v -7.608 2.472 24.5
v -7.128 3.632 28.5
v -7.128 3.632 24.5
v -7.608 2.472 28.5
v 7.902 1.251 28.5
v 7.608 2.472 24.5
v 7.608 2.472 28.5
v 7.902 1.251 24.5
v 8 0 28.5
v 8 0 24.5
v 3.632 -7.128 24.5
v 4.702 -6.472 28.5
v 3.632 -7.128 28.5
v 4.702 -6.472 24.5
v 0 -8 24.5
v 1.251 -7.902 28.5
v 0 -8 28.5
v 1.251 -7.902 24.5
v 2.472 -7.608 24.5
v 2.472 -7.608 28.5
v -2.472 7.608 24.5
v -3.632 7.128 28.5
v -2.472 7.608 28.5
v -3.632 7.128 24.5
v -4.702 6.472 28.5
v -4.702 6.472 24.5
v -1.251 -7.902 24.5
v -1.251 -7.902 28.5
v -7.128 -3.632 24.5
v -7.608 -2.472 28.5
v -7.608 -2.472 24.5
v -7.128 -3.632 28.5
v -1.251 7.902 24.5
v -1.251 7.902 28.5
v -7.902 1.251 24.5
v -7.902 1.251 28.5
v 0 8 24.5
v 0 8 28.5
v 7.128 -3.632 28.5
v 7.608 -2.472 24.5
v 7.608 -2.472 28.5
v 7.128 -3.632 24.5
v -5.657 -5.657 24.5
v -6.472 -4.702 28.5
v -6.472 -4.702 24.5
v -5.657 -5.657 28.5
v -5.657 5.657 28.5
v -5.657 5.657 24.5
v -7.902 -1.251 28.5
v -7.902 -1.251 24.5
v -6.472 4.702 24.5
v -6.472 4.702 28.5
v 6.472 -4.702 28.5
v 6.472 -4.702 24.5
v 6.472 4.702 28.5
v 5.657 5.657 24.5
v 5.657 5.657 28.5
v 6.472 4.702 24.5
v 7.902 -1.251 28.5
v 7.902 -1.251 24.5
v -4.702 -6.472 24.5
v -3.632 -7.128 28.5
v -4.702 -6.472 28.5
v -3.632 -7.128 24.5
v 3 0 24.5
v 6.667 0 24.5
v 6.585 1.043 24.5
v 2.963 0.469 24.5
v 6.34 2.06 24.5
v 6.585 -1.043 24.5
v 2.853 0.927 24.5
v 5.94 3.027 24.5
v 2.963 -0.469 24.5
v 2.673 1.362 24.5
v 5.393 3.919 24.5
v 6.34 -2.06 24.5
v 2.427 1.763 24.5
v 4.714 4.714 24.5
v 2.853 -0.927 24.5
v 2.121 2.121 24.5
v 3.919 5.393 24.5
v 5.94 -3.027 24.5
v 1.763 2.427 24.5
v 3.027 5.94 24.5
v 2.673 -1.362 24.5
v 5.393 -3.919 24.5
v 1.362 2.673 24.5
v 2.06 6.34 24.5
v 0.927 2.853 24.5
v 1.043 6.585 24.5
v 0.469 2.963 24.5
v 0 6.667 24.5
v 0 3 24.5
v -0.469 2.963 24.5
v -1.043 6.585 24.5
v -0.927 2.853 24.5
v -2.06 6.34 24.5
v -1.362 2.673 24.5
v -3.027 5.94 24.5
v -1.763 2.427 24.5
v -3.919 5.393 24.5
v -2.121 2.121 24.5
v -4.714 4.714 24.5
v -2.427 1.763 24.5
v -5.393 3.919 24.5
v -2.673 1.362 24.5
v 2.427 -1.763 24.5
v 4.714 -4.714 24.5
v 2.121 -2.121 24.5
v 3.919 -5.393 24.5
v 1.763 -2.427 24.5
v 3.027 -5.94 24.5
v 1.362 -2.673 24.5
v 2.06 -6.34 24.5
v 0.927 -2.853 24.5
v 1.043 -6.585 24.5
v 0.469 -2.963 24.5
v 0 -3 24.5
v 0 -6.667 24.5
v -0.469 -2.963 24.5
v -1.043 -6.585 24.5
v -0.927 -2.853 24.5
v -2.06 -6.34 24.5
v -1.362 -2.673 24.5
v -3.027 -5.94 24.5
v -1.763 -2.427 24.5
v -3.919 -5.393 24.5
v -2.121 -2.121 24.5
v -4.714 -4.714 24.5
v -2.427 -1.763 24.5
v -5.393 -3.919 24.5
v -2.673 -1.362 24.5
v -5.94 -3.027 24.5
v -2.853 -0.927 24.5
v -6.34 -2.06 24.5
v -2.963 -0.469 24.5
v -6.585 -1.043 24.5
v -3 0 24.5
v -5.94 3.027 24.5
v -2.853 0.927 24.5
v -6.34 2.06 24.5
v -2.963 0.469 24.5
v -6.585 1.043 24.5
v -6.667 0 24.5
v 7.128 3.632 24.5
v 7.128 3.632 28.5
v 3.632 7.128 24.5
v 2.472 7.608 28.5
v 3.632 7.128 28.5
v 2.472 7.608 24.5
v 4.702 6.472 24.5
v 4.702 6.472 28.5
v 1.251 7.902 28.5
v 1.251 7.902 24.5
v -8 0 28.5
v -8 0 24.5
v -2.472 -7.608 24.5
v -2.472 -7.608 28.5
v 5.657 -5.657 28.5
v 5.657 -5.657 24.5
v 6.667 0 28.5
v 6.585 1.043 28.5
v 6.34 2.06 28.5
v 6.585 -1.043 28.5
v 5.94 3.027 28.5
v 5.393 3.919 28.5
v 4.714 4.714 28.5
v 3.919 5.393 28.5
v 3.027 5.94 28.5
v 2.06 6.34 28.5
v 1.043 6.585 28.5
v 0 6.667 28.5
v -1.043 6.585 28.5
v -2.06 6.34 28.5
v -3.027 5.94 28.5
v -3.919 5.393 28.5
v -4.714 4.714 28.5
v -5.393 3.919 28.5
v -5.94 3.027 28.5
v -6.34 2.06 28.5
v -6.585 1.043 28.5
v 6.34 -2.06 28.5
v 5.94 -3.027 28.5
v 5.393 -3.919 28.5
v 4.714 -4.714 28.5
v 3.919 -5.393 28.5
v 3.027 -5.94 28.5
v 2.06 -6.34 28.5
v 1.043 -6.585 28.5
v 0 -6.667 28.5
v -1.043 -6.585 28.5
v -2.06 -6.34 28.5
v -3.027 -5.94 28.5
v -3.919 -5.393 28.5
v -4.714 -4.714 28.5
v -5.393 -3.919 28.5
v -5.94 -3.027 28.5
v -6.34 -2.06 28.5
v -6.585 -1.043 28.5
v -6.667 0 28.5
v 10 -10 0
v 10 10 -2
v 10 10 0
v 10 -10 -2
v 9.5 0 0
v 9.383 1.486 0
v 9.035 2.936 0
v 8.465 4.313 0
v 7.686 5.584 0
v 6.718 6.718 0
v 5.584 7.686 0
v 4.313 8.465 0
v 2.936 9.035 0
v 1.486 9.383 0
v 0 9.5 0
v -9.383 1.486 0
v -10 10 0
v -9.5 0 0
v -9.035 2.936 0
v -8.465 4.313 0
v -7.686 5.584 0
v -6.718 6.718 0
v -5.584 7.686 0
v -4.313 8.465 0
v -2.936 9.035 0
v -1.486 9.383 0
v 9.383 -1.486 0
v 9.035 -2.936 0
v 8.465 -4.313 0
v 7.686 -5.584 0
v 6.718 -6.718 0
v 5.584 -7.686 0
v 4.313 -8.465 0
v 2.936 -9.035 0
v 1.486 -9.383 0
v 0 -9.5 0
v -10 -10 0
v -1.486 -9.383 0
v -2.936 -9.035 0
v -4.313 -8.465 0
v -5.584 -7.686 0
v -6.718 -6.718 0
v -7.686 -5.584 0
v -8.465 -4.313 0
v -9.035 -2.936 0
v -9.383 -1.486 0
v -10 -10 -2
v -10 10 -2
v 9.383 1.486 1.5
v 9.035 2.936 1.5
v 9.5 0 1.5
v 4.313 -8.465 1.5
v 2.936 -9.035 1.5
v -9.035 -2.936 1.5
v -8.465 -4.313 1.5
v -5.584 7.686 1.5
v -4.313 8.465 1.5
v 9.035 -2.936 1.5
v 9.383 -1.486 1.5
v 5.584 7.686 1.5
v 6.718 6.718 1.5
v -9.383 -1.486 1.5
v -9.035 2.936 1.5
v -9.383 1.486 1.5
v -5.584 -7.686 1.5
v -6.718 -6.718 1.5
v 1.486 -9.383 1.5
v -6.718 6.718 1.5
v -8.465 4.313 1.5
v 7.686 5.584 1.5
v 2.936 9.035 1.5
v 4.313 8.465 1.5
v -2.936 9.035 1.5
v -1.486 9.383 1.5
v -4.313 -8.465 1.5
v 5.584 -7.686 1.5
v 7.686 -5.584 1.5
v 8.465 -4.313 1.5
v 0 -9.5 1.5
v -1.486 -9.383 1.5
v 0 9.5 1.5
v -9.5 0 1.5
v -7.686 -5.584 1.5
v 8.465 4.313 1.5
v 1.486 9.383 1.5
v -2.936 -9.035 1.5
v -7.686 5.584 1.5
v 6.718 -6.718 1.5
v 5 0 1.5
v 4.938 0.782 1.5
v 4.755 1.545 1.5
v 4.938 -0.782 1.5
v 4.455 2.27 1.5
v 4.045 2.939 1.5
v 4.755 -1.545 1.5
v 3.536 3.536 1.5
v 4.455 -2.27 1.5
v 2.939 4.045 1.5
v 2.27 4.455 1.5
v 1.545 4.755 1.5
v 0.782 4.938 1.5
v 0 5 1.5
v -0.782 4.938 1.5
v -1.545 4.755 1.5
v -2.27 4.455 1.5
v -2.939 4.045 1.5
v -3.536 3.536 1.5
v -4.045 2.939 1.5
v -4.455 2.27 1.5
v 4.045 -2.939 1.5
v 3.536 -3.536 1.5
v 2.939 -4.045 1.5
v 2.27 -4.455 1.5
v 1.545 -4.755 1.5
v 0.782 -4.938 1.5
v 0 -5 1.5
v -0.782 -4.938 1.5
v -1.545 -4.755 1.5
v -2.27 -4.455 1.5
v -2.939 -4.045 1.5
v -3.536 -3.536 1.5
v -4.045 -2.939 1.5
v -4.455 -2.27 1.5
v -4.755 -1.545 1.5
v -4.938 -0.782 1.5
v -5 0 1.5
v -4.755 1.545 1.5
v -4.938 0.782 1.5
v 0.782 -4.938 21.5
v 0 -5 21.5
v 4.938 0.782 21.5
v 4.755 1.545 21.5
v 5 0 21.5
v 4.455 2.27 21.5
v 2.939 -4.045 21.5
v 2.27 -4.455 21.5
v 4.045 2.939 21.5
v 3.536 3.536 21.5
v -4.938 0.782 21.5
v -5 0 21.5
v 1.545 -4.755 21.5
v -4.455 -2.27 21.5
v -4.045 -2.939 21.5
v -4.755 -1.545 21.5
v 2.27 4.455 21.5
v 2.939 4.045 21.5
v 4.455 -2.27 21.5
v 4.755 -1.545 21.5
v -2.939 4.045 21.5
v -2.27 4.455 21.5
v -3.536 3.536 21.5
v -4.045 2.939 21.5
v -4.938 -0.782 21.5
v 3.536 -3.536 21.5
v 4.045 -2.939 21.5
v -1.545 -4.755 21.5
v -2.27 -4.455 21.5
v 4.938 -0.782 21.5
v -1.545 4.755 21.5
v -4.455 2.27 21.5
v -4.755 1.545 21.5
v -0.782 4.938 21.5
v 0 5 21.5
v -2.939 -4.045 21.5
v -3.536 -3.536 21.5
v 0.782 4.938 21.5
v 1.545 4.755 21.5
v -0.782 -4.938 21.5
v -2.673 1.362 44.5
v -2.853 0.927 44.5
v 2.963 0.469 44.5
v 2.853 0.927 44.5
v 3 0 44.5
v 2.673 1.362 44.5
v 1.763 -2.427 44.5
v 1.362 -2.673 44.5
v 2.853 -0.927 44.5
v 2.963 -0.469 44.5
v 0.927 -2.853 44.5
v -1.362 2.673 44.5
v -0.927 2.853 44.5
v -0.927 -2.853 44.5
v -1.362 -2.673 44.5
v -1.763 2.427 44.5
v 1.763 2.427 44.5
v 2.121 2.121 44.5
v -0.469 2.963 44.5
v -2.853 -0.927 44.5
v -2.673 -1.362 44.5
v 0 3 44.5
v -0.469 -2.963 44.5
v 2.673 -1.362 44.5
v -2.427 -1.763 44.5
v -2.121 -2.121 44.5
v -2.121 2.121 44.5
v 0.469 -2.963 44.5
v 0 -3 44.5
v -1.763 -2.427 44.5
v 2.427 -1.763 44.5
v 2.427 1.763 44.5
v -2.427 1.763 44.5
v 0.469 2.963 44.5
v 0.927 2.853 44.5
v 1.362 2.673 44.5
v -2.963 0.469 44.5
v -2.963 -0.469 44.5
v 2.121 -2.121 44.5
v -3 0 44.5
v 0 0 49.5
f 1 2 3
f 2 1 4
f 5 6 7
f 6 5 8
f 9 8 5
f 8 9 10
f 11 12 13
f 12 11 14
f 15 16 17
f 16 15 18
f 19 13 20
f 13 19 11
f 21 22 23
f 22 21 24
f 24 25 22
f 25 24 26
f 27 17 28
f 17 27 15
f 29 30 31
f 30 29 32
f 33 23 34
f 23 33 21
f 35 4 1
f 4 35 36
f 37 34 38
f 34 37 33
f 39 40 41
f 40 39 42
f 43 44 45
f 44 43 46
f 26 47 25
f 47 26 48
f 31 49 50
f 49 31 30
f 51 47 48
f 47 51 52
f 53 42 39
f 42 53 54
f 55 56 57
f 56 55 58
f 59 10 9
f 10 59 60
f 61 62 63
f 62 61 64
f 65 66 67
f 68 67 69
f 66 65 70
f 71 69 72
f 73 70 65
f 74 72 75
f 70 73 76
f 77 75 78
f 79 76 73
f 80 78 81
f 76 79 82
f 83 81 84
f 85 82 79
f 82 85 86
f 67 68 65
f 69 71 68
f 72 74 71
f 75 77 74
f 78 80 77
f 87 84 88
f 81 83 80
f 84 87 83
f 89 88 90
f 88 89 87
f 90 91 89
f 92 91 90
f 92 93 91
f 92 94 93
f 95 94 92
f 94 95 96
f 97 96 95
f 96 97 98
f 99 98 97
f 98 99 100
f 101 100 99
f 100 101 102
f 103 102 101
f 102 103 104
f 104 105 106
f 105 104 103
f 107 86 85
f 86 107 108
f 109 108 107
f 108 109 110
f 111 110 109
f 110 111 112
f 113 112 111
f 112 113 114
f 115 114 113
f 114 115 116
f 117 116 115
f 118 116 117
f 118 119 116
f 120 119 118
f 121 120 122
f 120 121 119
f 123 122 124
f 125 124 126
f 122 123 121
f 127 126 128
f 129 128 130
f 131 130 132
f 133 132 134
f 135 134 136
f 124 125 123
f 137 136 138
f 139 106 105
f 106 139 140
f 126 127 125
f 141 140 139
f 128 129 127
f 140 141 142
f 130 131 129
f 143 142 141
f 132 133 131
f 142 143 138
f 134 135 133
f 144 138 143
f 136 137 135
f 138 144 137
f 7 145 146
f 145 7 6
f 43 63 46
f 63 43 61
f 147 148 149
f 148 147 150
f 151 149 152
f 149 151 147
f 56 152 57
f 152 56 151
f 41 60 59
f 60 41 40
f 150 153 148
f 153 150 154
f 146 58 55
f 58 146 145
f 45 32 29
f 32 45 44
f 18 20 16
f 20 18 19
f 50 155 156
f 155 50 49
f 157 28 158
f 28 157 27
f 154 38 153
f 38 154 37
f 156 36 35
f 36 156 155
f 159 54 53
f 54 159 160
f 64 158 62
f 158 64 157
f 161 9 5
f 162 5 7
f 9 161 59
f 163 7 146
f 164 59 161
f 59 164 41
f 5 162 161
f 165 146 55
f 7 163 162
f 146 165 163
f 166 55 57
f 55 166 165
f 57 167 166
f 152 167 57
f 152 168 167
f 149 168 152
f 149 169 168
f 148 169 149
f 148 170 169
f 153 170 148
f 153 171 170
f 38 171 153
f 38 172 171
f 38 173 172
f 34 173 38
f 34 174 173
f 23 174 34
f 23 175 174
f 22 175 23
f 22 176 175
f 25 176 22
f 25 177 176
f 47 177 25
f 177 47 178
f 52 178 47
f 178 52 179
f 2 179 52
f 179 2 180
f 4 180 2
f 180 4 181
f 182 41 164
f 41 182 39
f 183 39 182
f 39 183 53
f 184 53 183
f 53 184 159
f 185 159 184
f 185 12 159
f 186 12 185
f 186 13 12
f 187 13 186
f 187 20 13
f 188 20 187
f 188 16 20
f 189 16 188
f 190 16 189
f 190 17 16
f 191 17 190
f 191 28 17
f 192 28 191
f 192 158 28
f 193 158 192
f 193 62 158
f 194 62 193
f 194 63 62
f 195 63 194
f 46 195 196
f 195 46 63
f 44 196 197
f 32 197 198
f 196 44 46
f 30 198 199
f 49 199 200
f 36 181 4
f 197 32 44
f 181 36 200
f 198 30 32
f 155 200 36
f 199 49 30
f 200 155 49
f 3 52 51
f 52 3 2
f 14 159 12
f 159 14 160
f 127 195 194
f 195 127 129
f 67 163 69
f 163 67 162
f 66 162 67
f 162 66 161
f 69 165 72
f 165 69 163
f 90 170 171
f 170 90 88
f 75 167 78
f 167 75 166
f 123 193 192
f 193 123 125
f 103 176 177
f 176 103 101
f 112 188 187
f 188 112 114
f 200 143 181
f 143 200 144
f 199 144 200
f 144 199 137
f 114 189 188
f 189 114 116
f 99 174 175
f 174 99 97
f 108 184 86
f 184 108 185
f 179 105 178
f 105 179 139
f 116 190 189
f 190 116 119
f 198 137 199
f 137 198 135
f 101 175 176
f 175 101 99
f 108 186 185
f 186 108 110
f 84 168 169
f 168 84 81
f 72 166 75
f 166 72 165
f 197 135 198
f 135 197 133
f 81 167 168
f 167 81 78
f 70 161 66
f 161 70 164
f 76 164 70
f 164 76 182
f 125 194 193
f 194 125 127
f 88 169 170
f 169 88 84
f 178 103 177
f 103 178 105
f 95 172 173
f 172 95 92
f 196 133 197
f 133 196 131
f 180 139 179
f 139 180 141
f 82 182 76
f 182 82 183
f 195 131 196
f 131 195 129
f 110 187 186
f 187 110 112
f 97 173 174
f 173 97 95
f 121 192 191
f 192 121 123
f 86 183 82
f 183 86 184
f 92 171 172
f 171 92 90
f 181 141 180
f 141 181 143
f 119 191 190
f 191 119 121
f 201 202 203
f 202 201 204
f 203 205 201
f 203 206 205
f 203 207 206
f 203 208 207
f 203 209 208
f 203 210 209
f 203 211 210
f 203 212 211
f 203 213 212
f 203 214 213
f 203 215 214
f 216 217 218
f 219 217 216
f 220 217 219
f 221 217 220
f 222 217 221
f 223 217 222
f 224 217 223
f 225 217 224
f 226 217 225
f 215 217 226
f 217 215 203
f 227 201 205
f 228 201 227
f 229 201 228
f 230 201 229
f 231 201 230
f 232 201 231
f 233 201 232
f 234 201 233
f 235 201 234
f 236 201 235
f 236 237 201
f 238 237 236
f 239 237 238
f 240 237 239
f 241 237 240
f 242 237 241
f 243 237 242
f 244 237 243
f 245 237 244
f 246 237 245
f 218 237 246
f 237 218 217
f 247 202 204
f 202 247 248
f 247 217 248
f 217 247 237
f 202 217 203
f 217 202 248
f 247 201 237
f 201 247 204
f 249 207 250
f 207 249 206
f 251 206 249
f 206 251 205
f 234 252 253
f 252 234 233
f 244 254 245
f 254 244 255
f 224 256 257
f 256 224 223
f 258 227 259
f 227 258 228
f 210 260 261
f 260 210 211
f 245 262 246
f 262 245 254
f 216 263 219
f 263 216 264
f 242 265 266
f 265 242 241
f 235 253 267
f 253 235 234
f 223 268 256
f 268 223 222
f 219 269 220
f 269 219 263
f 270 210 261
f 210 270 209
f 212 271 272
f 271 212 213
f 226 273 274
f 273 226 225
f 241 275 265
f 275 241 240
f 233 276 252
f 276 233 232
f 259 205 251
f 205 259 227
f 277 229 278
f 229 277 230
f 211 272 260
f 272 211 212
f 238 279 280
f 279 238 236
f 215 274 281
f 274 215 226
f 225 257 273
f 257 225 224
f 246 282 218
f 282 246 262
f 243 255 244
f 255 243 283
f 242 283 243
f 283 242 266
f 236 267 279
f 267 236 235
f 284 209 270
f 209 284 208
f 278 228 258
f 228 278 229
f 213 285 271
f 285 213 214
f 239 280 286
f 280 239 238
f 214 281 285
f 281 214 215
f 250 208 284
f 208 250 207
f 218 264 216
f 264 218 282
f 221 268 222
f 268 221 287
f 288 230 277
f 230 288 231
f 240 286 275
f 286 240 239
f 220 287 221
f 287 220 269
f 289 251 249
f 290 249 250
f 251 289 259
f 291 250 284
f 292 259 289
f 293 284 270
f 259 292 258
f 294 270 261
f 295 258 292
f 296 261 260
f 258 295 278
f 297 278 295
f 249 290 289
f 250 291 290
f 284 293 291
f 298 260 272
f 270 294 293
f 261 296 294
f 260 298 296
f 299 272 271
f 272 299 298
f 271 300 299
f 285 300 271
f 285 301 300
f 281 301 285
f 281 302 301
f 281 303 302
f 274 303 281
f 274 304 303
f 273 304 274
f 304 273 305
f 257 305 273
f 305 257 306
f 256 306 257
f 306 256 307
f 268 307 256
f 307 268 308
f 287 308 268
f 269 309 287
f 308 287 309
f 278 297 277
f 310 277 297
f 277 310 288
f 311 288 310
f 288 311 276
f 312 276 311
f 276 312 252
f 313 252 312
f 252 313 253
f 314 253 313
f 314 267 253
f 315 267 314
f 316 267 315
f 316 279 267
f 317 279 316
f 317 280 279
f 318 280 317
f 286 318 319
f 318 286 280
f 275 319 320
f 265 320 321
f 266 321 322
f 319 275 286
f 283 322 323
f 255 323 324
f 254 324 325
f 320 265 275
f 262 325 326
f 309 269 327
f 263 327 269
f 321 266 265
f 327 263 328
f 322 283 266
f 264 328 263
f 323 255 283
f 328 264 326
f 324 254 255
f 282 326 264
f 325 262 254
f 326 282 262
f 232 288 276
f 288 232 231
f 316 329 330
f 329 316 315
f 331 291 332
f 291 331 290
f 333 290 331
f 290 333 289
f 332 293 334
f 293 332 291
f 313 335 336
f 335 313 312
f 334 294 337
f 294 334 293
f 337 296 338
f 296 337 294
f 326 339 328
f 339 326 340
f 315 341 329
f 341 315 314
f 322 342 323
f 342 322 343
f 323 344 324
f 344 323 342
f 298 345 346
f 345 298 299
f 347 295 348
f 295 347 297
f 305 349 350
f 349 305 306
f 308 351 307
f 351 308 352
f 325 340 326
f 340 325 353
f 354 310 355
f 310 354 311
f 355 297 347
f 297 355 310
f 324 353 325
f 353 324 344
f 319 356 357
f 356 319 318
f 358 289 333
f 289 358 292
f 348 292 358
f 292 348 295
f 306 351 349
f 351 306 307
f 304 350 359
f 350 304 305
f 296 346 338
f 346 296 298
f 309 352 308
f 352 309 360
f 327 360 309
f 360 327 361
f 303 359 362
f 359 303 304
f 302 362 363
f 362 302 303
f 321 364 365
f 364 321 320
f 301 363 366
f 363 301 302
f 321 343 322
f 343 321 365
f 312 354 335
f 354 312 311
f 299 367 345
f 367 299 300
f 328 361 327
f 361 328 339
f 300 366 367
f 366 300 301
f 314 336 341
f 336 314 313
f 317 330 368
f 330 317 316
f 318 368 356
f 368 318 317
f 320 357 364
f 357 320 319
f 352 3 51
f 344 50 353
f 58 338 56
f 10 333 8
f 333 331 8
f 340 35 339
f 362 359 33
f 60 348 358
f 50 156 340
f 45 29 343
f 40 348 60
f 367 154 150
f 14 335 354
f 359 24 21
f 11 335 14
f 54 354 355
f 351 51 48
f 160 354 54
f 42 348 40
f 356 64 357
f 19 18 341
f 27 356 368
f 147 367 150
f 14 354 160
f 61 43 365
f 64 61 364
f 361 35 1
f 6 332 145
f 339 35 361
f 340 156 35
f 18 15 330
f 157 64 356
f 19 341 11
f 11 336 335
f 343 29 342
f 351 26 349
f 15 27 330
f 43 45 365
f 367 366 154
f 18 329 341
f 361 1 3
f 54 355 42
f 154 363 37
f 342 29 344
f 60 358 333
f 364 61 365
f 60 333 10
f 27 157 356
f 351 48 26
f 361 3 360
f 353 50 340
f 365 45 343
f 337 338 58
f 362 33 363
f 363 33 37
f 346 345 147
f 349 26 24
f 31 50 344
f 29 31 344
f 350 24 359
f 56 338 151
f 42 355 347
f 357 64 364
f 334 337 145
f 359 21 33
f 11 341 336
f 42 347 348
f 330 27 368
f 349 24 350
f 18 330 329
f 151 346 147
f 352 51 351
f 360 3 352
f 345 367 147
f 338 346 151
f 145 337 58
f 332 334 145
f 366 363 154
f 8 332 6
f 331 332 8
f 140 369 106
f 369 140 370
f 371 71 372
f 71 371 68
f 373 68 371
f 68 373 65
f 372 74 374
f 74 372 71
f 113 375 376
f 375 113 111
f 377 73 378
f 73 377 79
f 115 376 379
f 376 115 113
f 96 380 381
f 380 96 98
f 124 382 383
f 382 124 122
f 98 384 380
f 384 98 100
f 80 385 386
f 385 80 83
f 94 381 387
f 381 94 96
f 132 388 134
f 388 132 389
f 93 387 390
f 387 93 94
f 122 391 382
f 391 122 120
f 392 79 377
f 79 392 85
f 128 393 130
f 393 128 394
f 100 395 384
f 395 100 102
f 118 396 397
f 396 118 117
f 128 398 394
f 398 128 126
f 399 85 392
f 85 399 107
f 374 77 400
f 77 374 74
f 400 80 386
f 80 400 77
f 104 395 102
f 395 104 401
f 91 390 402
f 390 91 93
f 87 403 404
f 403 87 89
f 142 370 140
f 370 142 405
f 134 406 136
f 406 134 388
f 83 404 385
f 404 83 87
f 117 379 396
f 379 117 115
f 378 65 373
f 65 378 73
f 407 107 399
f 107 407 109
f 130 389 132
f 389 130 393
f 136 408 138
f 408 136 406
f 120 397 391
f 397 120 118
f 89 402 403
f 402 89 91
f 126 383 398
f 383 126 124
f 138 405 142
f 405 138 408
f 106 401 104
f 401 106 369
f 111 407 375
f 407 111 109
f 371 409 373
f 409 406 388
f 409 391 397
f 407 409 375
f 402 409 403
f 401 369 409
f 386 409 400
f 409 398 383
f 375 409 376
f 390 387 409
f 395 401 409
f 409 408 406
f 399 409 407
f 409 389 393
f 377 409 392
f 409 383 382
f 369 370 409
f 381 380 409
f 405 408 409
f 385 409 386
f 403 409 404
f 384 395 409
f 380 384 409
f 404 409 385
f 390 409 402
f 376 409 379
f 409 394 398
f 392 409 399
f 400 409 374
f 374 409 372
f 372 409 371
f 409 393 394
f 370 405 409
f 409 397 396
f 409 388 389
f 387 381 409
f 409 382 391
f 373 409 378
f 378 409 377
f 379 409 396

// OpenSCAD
$fn=40; //[10,15,20,25,30,35,40,45,50]
bottomplate_thickness=2;	//[0:10]
bottomcircle_thickness=1.5; //[0.5:5]
firstlevel_hight=20;		//[5:40]
firstlevel_radius=5;		//[1:50]
secondlevel_hight=3;	//[0:10]
secondlevel_radius_top=firstlevel_radius+secondlevel_hight;
secondlevel_limit_hight=4;	//[0:10]
secondlevel_limit_thickness=secondlevel_limit_hight/3;
thirdlevel_hight=20;	//[0:50]
thirdlevel_radius=3;	//[0:50]
thirdlevel_top_hight=5;	//[0:50]

//bottom plate
translate(v=[0,0,-bottomplate_thickness/2])
	{
		cube(size=[20,20,bottomplate_thickness], center=true);
	}

//bottom circle plate
translate(v=[0,0,bottomcircle_thickness/2])
	{
		cylinder(h=bottomcircle_thickness, r=9.5, center=true);
	}

//first cylindrical level
translate(v=[0,0,firstlevel_hight/2+bottomcircle_thickness])
	{
		cylinder(h=firstlevel_hight, r=firstlevel_radius, center=true);
	}

//second level, angled cylinder
translate(v=[0,0,secondlevel_hight/2+firstlevel_hight+bottomcircle_thickness])
	{
		cylinder(h=secondlevel_hight, r1=firstlevel_radius, r2=secondlevel_radius_top, center=true);
	}

//second level limit
		translate(v=[0,0,secondlevel_limit_hight/2+secondlevel_hight+firstlevel_hight+bottomcircle_thickness])
	{	
		difference()
			{
				cylinder(h=secondlevel_limit_hight, r=secondlevel_radius_top, center=true);
		
				cylinder(h=secondlevel_limit_hight+0.1, r=secondlevel_radius_top-secondlevel_limit_thickness, center=true);
			}
	}
//third level
translate(v=[0,0,thirdlevel_hight/2+secondlevel_hight+firstlevel_hight+bottomcircle_thickness])
	{
		cylinder(h=thirdlevel_hight, r=thirdlevel_radius, center=true);
	}

//third level top
	translate(v=[0,0,thirdlevel_top_hight/2+thirdlevel_hight+secondlevel_hight+firstlevel_hight+bottomcircle_thickness])
	{
		cylinder(h=thirdlevel_top_hight, r1=thirdlevel_radius, r2=0, center=true);
	}





//union()
//{
//	translate(v=[0,0,-15])
		//{
			//cube(size = [15,15,30], center =true);
		//	cylinder(h=20, r=7.5);
	//	}	
//	sphere(r=7.5);
//}
